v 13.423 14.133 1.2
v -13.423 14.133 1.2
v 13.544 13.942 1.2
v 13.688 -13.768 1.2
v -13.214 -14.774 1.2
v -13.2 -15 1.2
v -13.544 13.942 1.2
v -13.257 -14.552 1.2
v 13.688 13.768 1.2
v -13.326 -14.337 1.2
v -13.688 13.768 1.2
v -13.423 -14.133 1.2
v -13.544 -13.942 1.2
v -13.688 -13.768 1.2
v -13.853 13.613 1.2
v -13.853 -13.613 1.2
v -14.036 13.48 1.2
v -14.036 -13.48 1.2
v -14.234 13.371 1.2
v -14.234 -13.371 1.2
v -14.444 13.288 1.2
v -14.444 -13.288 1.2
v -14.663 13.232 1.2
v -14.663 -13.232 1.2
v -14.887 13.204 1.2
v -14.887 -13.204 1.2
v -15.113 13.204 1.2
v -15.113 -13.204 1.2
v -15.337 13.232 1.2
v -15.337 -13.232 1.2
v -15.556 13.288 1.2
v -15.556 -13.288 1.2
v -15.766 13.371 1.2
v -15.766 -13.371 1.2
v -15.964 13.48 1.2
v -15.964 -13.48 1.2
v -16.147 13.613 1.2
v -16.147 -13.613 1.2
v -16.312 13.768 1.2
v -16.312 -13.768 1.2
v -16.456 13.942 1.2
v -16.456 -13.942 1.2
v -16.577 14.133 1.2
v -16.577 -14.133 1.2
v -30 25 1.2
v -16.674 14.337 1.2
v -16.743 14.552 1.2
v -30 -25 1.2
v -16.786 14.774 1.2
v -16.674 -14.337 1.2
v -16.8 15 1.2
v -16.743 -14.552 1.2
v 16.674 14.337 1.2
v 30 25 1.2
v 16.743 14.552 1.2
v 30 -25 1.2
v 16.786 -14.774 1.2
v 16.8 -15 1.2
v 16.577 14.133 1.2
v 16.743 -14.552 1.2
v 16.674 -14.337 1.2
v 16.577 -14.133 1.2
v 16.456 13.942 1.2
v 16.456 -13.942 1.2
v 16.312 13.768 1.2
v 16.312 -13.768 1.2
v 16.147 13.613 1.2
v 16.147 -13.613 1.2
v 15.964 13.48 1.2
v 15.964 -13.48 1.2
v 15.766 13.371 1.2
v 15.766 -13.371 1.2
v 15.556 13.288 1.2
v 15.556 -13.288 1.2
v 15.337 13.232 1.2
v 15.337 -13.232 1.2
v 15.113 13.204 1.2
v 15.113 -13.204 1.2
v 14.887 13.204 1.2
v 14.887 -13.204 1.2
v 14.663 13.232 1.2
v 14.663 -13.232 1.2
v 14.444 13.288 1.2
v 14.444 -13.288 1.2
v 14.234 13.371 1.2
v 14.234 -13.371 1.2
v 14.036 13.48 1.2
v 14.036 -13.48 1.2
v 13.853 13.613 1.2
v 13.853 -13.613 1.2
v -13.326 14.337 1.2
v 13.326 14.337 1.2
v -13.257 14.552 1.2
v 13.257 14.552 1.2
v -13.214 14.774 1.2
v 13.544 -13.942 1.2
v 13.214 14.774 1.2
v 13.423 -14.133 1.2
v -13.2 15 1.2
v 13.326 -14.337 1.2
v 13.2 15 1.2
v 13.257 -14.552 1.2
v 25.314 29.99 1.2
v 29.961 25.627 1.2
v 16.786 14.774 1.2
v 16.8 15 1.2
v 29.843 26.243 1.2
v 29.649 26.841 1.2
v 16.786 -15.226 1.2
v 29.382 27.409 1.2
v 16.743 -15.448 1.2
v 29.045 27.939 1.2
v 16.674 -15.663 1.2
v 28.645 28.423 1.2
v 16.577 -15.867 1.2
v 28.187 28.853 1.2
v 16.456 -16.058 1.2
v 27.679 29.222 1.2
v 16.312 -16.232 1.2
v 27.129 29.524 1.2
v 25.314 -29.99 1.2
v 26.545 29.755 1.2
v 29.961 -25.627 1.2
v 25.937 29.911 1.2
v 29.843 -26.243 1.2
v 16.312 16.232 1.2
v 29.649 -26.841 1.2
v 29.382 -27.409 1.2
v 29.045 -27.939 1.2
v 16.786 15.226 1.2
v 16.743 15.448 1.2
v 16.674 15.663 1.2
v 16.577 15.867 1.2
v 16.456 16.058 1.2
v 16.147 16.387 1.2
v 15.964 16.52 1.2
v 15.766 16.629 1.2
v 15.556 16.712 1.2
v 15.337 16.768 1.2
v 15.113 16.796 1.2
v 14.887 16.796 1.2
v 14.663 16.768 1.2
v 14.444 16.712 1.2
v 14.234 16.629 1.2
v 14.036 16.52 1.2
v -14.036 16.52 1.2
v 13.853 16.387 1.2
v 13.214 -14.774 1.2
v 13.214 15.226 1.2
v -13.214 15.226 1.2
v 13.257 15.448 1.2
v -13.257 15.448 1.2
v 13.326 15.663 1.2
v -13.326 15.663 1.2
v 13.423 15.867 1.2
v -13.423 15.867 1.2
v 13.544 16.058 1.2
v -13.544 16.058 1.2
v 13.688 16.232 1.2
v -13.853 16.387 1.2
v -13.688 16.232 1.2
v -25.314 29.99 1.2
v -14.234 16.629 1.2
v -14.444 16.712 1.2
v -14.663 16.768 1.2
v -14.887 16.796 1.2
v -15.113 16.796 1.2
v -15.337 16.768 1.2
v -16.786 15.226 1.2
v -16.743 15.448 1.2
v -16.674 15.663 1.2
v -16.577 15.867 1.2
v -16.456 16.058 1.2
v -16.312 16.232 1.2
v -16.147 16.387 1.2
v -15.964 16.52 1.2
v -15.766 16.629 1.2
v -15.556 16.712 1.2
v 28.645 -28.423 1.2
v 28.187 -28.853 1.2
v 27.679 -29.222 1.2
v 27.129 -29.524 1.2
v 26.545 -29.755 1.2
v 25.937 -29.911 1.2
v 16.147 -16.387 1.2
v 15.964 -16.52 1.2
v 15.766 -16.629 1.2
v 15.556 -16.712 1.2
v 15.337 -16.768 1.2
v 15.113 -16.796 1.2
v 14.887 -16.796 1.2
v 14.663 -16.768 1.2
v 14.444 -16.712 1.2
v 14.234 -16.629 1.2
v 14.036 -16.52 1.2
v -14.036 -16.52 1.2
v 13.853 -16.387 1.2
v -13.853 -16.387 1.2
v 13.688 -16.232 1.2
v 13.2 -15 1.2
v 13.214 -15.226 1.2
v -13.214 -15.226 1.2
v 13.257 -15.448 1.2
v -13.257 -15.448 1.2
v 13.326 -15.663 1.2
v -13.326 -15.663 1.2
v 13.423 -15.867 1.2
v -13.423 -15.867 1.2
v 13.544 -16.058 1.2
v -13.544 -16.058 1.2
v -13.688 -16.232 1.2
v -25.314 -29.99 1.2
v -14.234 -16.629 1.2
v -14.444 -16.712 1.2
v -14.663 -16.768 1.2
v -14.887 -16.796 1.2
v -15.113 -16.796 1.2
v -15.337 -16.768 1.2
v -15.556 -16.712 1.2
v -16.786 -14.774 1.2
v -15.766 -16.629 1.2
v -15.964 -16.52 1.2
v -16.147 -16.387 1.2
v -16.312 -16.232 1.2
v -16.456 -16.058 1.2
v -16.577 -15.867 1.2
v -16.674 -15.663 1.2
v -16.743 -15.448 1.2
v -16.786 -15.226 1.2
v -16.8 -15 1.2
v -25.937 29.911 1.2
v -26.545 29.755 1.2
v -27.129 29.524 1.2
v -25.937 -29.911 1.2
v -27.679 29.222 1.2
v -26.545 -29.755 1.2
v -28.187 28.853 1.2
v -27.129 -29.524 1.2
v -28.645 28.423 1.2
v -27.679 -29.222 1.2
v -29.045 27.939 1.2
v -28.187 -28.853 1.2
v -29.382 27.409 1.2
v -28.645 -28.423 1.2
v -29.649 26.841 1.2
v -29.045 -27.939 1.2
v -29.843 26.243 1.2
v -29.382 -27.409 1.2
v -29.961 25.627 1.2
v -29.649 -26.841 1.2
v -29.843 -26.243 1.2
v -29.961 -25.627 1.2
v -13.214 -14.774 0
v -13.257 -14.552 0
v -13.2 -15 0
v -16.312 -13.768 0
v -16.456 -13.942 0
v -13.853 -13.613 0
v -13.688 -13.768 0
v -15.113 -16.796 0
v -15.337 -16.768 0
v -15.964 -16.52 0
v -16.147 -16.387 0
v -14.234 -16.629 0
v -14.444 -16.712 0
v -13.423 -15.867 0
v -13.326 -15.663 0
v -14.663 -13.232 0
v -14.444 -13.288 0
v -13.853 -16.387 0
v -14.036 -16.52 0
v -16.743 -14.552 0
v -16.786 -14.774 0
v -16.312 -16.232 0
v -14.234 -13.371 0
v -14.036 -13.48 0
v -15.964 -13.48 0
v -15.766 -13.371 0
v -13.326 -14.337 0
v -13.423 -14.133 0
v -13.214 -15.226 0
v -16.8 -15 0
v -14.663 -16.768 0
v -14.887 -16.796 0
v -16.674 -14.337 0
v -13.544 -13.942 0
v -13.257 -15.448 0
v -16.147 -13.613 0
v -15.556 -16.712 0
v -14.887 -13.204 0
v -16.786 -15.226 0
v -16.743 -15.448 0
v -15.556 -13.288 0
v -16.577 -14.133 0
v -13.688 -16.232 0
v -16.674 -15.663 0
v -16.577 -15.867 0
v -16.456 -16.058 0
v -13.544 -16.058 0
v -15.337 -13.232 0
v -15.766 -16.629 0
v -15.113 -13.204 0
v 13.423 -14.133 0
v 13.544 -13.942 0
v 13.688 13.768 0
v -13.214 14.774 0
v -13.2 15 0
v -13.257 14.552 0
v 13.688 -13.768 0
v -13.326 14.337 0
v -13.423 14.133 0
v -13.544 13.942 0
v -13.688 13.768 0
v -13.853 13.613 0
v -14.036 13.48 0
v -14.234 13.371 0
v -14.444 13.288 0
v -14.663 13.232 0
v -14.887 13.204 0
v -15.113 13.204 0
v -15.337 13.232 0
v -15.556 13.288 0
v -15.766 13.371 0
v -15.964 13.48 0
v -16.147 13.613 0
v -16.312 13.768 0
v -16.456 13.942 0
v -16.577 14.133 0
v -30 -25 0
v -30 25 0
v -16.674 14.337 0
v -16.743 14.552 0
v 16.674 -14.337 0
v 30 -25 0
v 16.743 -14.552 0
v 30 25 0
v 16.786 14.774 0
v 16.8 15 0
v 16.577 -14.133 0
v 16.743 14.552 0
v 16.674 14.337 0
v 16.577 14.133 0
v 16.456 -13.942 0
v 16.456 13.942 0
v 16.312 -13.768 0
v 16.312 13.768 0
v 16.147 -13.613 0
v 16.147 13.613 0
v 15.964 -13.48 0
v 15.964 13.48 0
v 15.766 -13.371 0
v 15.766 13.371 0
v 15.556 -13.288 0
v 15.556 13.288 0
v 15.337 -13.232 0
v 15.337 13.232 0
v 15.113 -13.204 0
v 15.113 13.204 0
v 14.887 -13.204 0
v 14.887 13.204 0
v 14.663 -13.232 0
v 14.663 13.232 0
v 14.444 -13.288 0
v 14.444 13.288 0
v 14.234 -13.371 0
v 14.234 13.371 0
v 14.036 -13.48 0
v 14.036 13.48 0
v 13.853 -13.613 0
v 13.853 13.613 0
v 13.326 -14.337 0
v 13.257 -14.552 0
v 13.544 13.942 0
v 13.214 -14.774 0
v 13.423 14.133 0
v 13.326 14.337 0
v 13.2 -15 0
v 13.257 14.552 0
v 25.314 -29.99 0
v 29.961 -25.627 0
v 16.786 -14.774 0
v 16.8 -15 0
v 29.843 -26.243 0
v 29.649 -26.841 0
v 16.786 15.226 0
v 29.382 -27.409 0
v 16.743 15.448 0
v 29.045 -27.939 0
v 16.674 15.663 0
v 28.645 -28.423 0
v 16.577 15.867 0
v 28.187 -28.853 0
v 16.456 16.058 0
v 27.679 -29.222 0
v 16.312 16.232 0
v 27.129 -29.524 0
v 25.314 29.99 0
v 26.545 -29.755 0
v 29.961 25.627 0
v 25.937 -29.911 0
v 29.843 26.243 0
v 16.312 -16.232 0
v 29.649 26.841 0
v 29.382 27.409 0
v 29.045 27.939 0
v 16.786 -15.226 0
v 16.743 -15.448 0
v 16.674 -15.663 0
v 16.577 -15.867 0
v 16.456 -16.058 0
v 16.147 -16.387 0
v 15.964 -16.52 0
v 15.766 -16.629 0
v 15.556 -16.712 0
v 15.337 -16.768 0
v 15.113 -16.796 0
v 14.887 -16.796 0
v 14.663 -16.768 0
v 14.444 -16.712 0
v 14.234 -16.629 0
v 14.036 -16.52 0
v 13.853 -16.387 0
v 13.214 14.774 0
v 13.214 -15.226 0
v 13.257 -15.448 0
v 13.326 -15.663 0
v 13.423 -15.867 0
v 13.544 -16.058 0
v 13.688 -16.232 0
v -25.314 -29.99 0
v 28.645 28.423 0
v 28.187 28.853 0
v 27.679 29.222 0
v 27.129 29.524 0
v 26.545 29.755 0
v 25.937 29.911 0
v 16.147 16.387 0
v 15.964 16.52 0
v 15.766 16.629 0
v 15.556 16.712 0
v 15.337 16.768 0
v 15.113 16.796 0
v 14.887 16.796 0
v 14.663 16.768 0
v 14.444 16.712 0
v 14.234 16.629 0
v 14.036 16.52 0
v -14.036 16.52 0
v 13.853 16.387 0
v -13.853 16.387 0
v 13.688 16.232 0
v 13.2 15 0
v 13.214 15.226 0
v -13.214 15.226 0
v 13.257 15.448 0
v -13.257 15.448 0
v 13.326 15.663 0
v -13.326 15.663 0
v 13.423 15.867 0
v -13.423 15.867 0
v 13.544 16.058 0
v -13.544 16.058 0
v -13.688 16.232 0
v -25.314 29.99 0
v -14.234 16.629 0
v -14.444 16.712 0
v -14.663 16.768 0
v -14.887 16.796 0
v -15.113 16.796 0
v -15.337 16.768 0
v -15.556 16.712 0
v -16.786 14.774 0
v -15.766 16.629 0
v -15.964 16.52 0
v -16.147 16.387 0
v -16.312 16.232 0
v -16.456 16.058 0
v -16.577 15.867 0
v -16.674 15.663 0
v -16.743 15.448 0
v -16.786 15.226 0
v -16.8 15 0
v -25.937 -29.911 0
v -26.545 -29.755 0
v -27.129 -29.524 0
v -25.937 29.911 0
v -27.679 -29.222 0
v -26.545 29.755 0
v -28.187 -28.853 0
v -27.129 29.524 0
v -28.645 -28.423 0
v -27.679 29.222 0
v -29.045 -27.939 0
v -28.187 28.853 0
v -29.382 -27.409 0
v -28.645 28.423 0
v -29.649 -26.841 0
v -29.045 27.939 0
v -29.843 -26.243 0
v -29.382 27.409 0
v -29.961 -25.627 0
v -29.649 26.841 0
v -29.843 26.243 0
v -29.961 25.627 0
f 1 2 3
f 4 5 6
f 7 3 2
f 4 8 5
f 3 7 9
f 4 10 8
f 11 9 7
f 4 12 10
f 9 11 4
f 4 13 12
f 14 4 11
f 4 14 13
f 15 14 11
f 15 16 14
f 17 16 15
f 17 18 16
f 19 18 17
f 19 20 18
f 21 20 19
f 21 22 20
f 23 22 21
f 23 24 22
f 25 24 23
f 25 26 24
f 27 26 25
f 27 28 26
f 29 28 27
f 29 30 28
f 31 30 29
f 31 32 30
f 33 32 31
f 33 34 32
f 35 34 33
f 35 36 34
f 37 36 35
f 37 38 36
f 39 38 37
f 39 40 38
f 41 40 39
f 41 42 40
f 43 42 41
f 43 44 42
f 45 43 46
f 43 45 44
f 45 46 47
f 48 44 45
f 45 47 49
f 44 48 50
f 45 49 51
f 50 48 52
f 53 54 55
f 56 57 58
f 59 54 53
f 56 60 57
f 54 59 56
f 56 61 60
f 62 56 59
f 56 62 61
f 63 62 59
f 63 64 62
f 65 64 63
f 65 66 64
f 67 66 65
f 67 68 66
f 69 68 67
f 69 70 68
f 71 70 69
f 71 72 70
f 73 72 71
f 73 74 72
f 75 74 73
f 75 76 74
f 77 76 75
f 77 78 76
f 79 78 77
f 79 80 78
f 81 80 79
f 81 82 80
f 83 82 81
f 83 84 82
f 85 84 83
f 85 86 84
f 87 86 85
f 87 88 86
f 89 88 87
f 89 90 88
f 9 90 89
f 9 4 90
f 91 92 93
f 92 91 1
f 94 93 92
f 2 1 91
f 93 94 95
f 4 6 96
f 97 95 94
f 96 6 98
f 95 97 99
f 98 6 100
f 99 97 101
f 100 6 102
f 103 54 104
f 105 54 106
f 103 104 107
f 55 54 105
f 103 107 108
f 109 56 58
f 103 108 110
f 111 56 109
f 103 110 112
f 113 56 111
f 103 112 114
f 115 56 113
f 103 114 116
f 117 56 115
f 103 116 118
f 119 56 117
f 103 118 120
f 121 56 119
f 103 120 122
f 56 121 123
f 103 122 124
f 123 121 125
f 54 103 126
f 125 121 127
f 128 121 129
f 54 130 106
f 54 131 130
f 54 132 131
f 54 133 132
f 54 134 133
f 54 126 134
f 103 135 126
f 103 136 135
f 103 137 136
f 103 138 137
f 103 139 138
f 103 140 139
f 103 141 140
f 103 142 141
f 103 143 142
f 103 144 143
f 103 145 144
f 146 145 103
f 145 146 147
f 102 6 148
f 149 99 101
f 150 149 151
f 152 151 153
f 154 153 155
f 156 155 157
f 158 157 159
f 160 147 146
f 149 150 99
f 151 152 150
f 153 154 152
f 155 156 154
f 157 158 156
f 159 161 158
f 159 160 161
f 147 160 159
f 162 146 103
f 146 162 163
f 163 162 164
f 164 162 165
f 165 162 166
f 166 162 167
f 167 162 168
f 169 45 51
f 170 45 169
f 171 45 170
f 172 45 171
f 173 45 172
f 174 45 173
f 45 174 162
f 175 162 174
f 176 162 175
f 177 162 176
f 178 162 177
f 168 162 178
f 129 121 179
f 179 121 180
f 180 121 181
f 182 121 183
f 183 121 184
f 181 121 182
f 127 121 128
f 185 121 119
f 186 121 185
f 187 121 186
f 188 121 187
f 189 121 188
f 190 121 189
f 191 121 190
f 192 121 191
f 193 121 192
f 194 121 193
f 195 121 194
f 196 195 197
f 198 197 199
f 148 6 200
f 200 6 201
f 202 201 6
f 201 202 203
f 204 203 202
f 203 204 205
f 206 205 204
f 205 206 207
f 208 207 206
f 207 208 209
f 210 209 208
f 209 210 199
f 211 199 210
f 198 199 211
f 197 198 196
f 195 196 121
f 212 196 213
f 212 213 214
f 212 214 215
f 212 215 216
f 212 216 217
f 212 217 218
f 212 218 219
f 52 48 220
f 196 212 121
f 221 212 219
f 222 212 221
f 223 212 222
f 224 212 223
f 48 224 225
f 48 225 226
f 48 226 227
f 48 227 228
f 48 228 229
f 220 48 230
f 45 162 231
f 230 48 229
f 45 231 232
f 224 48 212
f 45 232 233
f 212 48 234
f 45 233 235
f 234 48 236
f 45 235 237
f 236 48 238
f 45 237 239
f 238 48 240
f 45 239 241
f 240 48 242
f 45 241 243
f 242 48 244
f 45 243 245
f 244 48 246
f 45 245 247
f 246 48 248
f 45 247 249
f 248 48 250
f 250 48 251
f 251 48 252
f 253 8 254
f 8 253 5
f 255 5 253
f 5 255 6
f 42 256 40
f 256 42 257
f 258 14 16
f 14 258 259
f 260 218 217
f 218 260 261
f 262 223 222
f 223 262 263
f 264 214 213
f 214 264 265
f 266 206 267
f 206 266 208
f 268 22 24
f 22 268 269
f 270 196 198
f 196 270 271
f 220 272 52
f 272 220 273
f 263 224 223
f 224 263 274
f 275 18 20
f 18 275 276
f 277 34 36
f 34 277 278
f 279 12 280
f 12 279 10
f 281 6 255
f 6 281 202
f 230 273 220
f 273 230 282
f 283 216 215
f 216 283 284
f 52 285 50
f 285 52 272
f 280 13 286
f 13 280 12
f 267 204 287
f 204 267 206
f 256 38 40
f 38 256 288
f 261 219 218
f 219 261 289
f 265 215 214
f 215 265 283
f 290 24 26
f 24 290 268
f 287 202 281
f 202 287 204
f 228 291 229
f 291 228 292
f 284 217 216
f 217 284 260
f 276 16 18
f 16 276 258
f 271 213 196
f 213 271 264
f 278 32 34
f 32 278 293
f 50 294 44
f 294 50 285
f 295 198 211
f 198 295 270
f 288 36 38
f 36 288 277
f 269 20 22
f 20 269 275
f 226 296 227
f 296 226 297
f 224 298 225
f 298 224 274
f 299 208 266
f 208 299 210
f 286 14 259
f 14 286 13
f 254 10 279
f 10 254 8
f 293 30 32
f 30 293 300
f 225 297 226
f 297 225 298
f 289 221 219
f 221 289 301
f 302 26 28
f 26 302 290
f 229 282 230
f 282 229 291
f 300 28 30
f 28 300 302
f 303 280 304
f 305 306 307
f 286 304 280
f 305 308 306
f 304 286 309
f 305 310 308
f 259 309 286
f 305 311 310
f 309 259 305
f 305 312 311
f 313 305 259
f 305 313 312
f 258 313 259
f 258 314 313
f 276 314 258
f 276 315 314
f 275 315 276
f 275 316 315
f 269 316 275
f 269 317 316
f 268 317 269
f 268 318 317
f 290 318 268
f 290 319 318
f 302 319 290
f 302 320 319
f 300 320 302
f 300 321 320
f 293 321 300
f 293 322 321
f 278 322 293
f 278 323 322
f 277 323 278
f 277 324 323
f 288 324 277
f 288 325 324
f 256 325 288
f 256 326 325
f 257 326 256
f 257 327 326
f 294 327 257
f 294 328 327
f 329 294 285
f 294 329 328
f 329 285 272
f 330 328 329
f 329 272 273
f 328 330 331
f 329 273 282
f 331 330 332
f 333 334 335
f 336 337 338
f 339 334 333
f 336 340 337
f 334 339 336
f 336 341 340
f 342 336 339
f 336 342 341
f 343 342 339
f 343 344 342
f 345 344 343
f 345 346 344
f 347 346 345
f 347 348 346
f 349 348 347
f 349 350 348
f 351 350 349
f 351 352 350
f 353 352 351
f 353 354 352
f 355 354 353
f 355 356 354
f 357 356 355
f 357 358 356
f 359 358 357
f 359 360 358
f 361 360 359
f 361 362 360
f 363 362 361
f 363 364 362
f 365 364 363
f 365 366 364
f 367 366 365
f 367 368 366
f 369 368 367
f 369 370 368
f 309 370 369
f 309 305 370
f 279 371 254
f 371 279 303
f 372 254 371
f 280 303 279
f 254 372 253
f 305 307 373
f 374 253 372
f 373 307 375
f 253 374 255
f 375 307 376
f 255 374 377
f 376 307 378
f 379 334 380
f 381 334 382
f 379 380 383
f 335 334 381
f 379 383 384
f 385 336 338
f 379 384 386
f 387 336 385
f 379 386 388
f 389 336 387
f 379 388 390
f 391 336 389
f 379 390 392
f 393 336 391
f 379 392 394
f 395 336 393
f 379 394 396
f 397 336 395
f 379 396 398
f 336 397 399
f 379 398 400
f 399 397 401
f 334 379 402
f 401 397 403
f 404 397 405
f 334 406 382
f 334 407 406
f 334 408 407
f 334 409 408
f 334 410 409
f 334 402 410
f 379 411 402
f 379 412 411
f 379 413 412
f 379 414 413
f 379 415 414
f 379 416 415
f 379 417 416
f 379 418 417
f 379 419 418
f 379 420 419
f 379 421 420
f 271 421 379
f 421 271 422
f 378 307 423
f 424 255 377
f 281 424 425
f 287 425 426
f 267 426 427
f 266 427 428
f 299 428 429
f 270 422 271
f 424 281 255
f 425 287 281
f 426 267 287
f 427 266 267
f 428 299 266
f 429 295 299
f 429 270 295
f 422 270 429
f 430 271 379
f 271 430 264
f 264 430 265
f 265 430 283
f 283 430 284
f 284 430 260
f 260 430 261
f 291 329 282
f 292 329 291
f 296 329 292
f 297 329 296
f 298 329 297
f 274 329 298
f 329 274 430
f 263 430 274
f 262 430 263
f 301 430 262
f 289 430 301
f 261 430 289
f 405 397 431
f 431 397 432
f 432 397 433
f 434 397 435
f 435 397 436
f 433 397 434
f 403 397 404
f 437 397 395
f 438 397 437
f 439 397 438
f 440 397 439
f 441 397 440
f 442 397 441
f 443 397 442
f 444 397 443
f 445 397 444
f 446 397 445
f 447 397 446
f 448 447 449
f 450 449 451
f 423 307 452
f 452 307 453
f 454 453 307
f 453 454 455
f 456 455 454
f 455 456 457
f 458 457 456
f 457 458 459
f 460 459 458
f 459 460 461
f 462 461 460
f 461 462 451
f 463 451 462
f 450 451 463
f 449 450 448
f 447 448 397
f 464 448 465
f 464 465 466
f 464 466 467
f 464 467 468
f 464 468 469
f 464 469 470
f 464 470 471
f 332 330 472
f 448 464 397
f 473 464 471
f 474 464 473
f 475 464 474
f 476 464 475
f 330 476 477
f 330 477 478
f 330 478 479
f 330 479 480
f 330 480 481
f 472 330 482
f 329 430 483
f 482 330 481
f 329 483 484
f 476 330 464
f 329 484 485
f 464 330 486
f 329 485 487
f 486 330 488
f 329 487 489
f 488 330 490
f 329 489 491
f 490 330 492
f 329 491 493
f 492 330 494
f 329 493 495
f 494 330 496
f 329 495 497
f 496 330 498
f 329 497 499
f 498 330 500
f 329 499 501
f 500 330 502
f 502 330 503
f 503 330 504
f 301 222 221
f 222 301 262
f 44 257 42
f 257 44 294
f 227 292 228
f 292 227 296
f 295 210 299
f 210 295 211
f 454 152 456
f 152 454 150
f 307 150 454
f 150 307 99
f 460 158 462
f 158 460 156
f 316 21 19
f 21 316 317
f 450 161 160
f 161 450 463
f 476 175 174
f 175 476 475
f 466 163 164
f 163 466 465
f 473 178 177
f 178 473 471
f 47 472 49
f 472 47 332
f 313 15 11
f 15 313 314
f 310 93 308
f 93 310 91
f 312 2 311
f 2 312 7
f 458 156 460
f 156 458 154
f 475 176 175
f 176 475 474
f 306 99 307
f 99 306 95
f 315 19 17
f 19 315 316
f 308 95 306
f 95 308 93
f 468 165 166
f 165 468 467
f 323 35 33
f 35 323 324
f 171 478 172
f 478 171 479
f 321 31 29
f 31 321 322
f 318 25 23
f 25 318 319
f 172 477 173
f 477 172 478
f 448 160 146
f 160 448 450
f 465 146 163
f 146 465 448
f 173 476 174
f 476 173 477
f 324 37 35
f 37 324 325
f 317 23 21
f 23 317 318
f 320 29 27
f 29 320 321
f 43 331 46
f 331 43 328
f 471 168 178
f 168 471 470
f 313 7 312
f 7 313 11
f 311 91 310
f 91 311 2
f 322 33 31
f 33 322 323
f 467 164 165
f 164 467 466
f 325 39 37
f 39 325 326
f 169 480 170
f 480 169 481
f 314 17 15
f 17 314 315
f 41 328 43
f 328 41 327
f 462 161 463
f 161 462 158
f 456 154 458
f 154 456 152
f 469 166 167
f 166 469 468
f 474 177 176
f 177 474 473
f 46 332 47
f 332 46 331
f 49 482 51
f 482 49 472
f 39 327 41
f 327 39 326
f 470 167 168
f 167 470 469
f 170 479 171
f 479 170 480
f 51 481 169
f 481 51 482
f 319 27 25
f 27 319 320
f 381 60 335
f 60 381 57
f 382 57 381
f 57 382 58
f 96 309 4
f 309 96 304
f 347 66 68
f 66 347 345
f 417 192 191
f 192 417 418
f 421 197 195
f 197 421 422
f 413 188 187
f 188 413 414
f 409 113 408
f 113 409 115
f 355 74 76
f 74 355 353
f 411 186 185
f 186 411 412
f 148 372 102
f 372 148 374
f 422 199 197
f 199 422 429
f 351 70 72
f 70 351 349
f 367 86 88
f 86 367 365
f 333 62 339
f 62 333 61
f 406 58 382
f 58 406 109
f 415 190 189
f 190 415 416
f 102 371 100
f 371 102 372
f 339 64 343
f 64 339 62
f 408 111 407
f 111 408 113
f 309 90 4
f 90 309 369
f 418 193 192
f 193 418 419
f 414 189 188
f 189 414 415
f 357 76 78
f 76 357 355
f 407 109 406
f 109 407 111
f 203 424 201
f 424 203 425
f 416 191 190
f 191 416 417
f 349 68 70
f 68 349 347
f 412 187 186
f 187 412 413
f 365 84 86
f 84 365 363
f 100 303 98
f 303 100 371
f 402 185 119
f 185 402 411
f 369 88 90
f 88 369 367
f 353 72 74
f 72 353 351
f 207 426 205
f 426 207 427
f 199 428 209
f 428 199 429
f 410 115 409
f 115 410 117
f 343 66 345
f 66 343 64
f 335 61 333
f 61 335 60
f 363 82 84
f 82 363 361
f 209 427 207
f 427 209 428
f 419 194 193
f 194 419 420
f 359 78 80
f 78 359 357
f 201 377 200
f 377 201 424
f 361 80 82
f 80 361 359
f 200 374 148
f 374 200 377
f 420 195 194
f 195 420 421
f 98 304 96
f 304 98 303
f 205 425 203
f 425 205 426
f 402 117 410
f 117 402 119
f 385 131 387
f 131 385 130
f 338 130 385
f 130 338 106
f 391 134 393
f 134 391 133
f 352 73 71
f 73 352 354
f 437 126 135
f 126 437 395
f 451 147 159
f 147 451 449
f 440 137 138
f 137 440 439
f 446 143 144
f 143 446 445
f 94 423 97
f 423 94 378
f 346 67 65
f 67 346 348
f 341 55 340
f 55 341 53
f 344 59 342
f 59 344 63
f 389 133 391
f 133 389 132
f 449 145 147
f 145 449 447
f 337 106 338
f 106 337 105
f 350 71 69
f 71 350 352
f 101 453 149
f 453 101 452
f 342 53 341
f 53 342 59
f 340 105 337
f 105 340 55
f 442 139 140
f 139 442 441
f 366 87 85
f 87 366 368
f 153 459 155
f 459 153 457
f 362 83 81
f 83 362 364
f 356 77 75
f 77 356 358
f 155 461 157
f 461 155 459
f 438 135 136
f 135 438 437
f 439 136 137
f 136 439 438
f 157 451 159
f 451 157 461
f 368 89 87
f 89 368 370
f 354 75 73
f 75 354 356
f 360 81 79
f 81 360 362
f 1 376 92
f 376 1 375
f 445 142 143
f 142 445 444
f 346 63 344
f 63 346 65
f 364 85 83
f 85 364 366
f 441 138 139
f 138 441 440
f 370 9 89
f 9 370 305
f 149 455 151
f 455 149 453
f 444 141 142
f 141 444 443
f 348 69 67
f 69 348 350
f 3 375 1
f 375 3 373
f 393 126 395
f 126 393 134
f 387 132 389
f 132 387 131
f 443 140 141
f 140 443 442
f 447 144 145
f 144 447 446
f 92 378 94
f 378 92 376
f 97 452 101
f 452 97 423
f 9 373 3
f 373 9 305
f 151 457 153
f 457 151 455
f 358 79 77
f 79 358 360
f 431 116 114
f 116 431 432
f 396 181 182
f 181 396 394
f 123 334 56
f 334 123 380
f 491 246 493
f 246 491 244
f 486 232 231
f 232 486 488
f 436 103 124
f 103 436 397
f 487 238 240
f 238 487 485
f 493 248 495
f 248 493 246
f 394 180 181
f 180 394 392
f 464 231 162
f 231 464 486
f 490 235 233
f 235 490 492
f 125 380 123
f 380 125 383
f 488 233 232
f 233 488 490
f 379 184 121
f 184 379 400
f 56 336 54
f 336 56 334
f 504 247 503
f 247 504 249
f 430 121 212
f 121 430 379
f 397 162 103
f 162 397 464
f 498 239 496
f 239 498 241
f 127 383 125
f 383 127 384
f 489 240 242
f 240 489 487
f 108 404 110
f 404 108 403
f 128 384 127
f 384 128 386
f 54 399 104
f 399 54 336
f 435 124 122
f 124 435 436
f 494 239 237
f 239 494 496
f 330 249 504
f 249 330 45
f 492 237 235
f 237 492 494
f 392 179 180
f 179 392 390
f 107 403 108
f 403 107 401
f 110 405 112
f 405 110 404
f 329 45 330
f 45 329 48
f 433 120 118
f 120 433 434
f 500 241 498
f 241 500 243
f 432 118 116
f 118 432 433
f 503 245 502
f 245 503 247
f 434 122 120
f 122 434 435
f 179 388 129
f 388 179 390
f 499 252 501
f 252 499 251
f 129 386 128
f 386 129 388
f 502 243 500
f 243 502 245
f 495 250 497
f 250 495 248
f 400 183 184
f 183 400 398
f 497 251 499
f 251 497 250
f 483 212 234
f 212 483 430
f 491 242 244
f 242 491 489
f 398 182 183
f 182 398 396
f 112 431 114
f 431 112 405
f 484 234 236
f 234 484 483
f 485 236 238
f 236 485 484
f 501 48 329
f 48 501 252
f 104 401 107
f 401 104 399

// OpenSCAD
$fn = 50;


difference() {
	union() {
		hull() {
			translate(v = [-25.0000000000, 25.0000000000, 0]) {
				cylinder(h = 24, r = 5);
			}
			translate(v = [25.0000000000, 25.0000000000, 0]) {
				cylinder(h = 24, r = 5);
			}
			translate(v = [-25.0000000000, -25.0000000000, 0]) {
				cylinder(h = 24, r = 5);
			}
			translate(v = [25.0000000000, -25.0000000000, 0]) {
				cylinder(h = 24, r = 5);
			}
		}
	}
	union() {
		translate(v = [0, 0, 1.2000000000]) {
			hull() {
				translate(v = [-25.0000000000, 25.0000000000, 0]) {
					cylinder(h = 22.8000000000, r = 3.8000000000);
				}
				translate(v = [25.0000000000, 25.0000000000, 0]) {
					cylinder(h = 22.8000000000, r = 3.8000000000);
				}
				translate(v = [-25.0000000000, -25.0000000000, 0]) {
					cylinder(h = 22.8000000000, r = 3.8000000000);
				}
				translate(v = [25.0000000000, -25.0000000000, 0]) {
					cylinder(h = 22.8000000000, r = 3.8000000000);
				}
			}
		}
		#translate(v = [-15.0000000000, -15.0000000000, 0]) {
			cylinder(h = 1.2000000000, r = 1.8000000000);
		}
		#translate(v = [-15.0000000000, 15.0000000000, 0]) {
			cylinder(h = 1.2000000000, r = 1.8000000000);
		}
		#translate(v = [15.0000000000, -15.0000000000, 0]) {
			cylinder(h = 1.2000000000, r = 1.8000000000);
		}
		#translate(v = [15.0000000000, 15.0000000000, 0]) {
			cylinder(h = 1.2000000000, r = 1.8000000000);
		}
		translate(v = [-250.0000000000, -250.0000000000, 1.2000000000]) {
			cube(size = [500, 500, 500]);
		}
		translate(v = [-250.0000000000, -250.0000000000, 1.2000000000]) {
			cube(size = [500, 500, 500]);
		}
		translate(v = [-250.0000000000, -250.0000000000, 1.2000000000]) {
			cube(size = [500, 500, 500]);
		}
	}
}
